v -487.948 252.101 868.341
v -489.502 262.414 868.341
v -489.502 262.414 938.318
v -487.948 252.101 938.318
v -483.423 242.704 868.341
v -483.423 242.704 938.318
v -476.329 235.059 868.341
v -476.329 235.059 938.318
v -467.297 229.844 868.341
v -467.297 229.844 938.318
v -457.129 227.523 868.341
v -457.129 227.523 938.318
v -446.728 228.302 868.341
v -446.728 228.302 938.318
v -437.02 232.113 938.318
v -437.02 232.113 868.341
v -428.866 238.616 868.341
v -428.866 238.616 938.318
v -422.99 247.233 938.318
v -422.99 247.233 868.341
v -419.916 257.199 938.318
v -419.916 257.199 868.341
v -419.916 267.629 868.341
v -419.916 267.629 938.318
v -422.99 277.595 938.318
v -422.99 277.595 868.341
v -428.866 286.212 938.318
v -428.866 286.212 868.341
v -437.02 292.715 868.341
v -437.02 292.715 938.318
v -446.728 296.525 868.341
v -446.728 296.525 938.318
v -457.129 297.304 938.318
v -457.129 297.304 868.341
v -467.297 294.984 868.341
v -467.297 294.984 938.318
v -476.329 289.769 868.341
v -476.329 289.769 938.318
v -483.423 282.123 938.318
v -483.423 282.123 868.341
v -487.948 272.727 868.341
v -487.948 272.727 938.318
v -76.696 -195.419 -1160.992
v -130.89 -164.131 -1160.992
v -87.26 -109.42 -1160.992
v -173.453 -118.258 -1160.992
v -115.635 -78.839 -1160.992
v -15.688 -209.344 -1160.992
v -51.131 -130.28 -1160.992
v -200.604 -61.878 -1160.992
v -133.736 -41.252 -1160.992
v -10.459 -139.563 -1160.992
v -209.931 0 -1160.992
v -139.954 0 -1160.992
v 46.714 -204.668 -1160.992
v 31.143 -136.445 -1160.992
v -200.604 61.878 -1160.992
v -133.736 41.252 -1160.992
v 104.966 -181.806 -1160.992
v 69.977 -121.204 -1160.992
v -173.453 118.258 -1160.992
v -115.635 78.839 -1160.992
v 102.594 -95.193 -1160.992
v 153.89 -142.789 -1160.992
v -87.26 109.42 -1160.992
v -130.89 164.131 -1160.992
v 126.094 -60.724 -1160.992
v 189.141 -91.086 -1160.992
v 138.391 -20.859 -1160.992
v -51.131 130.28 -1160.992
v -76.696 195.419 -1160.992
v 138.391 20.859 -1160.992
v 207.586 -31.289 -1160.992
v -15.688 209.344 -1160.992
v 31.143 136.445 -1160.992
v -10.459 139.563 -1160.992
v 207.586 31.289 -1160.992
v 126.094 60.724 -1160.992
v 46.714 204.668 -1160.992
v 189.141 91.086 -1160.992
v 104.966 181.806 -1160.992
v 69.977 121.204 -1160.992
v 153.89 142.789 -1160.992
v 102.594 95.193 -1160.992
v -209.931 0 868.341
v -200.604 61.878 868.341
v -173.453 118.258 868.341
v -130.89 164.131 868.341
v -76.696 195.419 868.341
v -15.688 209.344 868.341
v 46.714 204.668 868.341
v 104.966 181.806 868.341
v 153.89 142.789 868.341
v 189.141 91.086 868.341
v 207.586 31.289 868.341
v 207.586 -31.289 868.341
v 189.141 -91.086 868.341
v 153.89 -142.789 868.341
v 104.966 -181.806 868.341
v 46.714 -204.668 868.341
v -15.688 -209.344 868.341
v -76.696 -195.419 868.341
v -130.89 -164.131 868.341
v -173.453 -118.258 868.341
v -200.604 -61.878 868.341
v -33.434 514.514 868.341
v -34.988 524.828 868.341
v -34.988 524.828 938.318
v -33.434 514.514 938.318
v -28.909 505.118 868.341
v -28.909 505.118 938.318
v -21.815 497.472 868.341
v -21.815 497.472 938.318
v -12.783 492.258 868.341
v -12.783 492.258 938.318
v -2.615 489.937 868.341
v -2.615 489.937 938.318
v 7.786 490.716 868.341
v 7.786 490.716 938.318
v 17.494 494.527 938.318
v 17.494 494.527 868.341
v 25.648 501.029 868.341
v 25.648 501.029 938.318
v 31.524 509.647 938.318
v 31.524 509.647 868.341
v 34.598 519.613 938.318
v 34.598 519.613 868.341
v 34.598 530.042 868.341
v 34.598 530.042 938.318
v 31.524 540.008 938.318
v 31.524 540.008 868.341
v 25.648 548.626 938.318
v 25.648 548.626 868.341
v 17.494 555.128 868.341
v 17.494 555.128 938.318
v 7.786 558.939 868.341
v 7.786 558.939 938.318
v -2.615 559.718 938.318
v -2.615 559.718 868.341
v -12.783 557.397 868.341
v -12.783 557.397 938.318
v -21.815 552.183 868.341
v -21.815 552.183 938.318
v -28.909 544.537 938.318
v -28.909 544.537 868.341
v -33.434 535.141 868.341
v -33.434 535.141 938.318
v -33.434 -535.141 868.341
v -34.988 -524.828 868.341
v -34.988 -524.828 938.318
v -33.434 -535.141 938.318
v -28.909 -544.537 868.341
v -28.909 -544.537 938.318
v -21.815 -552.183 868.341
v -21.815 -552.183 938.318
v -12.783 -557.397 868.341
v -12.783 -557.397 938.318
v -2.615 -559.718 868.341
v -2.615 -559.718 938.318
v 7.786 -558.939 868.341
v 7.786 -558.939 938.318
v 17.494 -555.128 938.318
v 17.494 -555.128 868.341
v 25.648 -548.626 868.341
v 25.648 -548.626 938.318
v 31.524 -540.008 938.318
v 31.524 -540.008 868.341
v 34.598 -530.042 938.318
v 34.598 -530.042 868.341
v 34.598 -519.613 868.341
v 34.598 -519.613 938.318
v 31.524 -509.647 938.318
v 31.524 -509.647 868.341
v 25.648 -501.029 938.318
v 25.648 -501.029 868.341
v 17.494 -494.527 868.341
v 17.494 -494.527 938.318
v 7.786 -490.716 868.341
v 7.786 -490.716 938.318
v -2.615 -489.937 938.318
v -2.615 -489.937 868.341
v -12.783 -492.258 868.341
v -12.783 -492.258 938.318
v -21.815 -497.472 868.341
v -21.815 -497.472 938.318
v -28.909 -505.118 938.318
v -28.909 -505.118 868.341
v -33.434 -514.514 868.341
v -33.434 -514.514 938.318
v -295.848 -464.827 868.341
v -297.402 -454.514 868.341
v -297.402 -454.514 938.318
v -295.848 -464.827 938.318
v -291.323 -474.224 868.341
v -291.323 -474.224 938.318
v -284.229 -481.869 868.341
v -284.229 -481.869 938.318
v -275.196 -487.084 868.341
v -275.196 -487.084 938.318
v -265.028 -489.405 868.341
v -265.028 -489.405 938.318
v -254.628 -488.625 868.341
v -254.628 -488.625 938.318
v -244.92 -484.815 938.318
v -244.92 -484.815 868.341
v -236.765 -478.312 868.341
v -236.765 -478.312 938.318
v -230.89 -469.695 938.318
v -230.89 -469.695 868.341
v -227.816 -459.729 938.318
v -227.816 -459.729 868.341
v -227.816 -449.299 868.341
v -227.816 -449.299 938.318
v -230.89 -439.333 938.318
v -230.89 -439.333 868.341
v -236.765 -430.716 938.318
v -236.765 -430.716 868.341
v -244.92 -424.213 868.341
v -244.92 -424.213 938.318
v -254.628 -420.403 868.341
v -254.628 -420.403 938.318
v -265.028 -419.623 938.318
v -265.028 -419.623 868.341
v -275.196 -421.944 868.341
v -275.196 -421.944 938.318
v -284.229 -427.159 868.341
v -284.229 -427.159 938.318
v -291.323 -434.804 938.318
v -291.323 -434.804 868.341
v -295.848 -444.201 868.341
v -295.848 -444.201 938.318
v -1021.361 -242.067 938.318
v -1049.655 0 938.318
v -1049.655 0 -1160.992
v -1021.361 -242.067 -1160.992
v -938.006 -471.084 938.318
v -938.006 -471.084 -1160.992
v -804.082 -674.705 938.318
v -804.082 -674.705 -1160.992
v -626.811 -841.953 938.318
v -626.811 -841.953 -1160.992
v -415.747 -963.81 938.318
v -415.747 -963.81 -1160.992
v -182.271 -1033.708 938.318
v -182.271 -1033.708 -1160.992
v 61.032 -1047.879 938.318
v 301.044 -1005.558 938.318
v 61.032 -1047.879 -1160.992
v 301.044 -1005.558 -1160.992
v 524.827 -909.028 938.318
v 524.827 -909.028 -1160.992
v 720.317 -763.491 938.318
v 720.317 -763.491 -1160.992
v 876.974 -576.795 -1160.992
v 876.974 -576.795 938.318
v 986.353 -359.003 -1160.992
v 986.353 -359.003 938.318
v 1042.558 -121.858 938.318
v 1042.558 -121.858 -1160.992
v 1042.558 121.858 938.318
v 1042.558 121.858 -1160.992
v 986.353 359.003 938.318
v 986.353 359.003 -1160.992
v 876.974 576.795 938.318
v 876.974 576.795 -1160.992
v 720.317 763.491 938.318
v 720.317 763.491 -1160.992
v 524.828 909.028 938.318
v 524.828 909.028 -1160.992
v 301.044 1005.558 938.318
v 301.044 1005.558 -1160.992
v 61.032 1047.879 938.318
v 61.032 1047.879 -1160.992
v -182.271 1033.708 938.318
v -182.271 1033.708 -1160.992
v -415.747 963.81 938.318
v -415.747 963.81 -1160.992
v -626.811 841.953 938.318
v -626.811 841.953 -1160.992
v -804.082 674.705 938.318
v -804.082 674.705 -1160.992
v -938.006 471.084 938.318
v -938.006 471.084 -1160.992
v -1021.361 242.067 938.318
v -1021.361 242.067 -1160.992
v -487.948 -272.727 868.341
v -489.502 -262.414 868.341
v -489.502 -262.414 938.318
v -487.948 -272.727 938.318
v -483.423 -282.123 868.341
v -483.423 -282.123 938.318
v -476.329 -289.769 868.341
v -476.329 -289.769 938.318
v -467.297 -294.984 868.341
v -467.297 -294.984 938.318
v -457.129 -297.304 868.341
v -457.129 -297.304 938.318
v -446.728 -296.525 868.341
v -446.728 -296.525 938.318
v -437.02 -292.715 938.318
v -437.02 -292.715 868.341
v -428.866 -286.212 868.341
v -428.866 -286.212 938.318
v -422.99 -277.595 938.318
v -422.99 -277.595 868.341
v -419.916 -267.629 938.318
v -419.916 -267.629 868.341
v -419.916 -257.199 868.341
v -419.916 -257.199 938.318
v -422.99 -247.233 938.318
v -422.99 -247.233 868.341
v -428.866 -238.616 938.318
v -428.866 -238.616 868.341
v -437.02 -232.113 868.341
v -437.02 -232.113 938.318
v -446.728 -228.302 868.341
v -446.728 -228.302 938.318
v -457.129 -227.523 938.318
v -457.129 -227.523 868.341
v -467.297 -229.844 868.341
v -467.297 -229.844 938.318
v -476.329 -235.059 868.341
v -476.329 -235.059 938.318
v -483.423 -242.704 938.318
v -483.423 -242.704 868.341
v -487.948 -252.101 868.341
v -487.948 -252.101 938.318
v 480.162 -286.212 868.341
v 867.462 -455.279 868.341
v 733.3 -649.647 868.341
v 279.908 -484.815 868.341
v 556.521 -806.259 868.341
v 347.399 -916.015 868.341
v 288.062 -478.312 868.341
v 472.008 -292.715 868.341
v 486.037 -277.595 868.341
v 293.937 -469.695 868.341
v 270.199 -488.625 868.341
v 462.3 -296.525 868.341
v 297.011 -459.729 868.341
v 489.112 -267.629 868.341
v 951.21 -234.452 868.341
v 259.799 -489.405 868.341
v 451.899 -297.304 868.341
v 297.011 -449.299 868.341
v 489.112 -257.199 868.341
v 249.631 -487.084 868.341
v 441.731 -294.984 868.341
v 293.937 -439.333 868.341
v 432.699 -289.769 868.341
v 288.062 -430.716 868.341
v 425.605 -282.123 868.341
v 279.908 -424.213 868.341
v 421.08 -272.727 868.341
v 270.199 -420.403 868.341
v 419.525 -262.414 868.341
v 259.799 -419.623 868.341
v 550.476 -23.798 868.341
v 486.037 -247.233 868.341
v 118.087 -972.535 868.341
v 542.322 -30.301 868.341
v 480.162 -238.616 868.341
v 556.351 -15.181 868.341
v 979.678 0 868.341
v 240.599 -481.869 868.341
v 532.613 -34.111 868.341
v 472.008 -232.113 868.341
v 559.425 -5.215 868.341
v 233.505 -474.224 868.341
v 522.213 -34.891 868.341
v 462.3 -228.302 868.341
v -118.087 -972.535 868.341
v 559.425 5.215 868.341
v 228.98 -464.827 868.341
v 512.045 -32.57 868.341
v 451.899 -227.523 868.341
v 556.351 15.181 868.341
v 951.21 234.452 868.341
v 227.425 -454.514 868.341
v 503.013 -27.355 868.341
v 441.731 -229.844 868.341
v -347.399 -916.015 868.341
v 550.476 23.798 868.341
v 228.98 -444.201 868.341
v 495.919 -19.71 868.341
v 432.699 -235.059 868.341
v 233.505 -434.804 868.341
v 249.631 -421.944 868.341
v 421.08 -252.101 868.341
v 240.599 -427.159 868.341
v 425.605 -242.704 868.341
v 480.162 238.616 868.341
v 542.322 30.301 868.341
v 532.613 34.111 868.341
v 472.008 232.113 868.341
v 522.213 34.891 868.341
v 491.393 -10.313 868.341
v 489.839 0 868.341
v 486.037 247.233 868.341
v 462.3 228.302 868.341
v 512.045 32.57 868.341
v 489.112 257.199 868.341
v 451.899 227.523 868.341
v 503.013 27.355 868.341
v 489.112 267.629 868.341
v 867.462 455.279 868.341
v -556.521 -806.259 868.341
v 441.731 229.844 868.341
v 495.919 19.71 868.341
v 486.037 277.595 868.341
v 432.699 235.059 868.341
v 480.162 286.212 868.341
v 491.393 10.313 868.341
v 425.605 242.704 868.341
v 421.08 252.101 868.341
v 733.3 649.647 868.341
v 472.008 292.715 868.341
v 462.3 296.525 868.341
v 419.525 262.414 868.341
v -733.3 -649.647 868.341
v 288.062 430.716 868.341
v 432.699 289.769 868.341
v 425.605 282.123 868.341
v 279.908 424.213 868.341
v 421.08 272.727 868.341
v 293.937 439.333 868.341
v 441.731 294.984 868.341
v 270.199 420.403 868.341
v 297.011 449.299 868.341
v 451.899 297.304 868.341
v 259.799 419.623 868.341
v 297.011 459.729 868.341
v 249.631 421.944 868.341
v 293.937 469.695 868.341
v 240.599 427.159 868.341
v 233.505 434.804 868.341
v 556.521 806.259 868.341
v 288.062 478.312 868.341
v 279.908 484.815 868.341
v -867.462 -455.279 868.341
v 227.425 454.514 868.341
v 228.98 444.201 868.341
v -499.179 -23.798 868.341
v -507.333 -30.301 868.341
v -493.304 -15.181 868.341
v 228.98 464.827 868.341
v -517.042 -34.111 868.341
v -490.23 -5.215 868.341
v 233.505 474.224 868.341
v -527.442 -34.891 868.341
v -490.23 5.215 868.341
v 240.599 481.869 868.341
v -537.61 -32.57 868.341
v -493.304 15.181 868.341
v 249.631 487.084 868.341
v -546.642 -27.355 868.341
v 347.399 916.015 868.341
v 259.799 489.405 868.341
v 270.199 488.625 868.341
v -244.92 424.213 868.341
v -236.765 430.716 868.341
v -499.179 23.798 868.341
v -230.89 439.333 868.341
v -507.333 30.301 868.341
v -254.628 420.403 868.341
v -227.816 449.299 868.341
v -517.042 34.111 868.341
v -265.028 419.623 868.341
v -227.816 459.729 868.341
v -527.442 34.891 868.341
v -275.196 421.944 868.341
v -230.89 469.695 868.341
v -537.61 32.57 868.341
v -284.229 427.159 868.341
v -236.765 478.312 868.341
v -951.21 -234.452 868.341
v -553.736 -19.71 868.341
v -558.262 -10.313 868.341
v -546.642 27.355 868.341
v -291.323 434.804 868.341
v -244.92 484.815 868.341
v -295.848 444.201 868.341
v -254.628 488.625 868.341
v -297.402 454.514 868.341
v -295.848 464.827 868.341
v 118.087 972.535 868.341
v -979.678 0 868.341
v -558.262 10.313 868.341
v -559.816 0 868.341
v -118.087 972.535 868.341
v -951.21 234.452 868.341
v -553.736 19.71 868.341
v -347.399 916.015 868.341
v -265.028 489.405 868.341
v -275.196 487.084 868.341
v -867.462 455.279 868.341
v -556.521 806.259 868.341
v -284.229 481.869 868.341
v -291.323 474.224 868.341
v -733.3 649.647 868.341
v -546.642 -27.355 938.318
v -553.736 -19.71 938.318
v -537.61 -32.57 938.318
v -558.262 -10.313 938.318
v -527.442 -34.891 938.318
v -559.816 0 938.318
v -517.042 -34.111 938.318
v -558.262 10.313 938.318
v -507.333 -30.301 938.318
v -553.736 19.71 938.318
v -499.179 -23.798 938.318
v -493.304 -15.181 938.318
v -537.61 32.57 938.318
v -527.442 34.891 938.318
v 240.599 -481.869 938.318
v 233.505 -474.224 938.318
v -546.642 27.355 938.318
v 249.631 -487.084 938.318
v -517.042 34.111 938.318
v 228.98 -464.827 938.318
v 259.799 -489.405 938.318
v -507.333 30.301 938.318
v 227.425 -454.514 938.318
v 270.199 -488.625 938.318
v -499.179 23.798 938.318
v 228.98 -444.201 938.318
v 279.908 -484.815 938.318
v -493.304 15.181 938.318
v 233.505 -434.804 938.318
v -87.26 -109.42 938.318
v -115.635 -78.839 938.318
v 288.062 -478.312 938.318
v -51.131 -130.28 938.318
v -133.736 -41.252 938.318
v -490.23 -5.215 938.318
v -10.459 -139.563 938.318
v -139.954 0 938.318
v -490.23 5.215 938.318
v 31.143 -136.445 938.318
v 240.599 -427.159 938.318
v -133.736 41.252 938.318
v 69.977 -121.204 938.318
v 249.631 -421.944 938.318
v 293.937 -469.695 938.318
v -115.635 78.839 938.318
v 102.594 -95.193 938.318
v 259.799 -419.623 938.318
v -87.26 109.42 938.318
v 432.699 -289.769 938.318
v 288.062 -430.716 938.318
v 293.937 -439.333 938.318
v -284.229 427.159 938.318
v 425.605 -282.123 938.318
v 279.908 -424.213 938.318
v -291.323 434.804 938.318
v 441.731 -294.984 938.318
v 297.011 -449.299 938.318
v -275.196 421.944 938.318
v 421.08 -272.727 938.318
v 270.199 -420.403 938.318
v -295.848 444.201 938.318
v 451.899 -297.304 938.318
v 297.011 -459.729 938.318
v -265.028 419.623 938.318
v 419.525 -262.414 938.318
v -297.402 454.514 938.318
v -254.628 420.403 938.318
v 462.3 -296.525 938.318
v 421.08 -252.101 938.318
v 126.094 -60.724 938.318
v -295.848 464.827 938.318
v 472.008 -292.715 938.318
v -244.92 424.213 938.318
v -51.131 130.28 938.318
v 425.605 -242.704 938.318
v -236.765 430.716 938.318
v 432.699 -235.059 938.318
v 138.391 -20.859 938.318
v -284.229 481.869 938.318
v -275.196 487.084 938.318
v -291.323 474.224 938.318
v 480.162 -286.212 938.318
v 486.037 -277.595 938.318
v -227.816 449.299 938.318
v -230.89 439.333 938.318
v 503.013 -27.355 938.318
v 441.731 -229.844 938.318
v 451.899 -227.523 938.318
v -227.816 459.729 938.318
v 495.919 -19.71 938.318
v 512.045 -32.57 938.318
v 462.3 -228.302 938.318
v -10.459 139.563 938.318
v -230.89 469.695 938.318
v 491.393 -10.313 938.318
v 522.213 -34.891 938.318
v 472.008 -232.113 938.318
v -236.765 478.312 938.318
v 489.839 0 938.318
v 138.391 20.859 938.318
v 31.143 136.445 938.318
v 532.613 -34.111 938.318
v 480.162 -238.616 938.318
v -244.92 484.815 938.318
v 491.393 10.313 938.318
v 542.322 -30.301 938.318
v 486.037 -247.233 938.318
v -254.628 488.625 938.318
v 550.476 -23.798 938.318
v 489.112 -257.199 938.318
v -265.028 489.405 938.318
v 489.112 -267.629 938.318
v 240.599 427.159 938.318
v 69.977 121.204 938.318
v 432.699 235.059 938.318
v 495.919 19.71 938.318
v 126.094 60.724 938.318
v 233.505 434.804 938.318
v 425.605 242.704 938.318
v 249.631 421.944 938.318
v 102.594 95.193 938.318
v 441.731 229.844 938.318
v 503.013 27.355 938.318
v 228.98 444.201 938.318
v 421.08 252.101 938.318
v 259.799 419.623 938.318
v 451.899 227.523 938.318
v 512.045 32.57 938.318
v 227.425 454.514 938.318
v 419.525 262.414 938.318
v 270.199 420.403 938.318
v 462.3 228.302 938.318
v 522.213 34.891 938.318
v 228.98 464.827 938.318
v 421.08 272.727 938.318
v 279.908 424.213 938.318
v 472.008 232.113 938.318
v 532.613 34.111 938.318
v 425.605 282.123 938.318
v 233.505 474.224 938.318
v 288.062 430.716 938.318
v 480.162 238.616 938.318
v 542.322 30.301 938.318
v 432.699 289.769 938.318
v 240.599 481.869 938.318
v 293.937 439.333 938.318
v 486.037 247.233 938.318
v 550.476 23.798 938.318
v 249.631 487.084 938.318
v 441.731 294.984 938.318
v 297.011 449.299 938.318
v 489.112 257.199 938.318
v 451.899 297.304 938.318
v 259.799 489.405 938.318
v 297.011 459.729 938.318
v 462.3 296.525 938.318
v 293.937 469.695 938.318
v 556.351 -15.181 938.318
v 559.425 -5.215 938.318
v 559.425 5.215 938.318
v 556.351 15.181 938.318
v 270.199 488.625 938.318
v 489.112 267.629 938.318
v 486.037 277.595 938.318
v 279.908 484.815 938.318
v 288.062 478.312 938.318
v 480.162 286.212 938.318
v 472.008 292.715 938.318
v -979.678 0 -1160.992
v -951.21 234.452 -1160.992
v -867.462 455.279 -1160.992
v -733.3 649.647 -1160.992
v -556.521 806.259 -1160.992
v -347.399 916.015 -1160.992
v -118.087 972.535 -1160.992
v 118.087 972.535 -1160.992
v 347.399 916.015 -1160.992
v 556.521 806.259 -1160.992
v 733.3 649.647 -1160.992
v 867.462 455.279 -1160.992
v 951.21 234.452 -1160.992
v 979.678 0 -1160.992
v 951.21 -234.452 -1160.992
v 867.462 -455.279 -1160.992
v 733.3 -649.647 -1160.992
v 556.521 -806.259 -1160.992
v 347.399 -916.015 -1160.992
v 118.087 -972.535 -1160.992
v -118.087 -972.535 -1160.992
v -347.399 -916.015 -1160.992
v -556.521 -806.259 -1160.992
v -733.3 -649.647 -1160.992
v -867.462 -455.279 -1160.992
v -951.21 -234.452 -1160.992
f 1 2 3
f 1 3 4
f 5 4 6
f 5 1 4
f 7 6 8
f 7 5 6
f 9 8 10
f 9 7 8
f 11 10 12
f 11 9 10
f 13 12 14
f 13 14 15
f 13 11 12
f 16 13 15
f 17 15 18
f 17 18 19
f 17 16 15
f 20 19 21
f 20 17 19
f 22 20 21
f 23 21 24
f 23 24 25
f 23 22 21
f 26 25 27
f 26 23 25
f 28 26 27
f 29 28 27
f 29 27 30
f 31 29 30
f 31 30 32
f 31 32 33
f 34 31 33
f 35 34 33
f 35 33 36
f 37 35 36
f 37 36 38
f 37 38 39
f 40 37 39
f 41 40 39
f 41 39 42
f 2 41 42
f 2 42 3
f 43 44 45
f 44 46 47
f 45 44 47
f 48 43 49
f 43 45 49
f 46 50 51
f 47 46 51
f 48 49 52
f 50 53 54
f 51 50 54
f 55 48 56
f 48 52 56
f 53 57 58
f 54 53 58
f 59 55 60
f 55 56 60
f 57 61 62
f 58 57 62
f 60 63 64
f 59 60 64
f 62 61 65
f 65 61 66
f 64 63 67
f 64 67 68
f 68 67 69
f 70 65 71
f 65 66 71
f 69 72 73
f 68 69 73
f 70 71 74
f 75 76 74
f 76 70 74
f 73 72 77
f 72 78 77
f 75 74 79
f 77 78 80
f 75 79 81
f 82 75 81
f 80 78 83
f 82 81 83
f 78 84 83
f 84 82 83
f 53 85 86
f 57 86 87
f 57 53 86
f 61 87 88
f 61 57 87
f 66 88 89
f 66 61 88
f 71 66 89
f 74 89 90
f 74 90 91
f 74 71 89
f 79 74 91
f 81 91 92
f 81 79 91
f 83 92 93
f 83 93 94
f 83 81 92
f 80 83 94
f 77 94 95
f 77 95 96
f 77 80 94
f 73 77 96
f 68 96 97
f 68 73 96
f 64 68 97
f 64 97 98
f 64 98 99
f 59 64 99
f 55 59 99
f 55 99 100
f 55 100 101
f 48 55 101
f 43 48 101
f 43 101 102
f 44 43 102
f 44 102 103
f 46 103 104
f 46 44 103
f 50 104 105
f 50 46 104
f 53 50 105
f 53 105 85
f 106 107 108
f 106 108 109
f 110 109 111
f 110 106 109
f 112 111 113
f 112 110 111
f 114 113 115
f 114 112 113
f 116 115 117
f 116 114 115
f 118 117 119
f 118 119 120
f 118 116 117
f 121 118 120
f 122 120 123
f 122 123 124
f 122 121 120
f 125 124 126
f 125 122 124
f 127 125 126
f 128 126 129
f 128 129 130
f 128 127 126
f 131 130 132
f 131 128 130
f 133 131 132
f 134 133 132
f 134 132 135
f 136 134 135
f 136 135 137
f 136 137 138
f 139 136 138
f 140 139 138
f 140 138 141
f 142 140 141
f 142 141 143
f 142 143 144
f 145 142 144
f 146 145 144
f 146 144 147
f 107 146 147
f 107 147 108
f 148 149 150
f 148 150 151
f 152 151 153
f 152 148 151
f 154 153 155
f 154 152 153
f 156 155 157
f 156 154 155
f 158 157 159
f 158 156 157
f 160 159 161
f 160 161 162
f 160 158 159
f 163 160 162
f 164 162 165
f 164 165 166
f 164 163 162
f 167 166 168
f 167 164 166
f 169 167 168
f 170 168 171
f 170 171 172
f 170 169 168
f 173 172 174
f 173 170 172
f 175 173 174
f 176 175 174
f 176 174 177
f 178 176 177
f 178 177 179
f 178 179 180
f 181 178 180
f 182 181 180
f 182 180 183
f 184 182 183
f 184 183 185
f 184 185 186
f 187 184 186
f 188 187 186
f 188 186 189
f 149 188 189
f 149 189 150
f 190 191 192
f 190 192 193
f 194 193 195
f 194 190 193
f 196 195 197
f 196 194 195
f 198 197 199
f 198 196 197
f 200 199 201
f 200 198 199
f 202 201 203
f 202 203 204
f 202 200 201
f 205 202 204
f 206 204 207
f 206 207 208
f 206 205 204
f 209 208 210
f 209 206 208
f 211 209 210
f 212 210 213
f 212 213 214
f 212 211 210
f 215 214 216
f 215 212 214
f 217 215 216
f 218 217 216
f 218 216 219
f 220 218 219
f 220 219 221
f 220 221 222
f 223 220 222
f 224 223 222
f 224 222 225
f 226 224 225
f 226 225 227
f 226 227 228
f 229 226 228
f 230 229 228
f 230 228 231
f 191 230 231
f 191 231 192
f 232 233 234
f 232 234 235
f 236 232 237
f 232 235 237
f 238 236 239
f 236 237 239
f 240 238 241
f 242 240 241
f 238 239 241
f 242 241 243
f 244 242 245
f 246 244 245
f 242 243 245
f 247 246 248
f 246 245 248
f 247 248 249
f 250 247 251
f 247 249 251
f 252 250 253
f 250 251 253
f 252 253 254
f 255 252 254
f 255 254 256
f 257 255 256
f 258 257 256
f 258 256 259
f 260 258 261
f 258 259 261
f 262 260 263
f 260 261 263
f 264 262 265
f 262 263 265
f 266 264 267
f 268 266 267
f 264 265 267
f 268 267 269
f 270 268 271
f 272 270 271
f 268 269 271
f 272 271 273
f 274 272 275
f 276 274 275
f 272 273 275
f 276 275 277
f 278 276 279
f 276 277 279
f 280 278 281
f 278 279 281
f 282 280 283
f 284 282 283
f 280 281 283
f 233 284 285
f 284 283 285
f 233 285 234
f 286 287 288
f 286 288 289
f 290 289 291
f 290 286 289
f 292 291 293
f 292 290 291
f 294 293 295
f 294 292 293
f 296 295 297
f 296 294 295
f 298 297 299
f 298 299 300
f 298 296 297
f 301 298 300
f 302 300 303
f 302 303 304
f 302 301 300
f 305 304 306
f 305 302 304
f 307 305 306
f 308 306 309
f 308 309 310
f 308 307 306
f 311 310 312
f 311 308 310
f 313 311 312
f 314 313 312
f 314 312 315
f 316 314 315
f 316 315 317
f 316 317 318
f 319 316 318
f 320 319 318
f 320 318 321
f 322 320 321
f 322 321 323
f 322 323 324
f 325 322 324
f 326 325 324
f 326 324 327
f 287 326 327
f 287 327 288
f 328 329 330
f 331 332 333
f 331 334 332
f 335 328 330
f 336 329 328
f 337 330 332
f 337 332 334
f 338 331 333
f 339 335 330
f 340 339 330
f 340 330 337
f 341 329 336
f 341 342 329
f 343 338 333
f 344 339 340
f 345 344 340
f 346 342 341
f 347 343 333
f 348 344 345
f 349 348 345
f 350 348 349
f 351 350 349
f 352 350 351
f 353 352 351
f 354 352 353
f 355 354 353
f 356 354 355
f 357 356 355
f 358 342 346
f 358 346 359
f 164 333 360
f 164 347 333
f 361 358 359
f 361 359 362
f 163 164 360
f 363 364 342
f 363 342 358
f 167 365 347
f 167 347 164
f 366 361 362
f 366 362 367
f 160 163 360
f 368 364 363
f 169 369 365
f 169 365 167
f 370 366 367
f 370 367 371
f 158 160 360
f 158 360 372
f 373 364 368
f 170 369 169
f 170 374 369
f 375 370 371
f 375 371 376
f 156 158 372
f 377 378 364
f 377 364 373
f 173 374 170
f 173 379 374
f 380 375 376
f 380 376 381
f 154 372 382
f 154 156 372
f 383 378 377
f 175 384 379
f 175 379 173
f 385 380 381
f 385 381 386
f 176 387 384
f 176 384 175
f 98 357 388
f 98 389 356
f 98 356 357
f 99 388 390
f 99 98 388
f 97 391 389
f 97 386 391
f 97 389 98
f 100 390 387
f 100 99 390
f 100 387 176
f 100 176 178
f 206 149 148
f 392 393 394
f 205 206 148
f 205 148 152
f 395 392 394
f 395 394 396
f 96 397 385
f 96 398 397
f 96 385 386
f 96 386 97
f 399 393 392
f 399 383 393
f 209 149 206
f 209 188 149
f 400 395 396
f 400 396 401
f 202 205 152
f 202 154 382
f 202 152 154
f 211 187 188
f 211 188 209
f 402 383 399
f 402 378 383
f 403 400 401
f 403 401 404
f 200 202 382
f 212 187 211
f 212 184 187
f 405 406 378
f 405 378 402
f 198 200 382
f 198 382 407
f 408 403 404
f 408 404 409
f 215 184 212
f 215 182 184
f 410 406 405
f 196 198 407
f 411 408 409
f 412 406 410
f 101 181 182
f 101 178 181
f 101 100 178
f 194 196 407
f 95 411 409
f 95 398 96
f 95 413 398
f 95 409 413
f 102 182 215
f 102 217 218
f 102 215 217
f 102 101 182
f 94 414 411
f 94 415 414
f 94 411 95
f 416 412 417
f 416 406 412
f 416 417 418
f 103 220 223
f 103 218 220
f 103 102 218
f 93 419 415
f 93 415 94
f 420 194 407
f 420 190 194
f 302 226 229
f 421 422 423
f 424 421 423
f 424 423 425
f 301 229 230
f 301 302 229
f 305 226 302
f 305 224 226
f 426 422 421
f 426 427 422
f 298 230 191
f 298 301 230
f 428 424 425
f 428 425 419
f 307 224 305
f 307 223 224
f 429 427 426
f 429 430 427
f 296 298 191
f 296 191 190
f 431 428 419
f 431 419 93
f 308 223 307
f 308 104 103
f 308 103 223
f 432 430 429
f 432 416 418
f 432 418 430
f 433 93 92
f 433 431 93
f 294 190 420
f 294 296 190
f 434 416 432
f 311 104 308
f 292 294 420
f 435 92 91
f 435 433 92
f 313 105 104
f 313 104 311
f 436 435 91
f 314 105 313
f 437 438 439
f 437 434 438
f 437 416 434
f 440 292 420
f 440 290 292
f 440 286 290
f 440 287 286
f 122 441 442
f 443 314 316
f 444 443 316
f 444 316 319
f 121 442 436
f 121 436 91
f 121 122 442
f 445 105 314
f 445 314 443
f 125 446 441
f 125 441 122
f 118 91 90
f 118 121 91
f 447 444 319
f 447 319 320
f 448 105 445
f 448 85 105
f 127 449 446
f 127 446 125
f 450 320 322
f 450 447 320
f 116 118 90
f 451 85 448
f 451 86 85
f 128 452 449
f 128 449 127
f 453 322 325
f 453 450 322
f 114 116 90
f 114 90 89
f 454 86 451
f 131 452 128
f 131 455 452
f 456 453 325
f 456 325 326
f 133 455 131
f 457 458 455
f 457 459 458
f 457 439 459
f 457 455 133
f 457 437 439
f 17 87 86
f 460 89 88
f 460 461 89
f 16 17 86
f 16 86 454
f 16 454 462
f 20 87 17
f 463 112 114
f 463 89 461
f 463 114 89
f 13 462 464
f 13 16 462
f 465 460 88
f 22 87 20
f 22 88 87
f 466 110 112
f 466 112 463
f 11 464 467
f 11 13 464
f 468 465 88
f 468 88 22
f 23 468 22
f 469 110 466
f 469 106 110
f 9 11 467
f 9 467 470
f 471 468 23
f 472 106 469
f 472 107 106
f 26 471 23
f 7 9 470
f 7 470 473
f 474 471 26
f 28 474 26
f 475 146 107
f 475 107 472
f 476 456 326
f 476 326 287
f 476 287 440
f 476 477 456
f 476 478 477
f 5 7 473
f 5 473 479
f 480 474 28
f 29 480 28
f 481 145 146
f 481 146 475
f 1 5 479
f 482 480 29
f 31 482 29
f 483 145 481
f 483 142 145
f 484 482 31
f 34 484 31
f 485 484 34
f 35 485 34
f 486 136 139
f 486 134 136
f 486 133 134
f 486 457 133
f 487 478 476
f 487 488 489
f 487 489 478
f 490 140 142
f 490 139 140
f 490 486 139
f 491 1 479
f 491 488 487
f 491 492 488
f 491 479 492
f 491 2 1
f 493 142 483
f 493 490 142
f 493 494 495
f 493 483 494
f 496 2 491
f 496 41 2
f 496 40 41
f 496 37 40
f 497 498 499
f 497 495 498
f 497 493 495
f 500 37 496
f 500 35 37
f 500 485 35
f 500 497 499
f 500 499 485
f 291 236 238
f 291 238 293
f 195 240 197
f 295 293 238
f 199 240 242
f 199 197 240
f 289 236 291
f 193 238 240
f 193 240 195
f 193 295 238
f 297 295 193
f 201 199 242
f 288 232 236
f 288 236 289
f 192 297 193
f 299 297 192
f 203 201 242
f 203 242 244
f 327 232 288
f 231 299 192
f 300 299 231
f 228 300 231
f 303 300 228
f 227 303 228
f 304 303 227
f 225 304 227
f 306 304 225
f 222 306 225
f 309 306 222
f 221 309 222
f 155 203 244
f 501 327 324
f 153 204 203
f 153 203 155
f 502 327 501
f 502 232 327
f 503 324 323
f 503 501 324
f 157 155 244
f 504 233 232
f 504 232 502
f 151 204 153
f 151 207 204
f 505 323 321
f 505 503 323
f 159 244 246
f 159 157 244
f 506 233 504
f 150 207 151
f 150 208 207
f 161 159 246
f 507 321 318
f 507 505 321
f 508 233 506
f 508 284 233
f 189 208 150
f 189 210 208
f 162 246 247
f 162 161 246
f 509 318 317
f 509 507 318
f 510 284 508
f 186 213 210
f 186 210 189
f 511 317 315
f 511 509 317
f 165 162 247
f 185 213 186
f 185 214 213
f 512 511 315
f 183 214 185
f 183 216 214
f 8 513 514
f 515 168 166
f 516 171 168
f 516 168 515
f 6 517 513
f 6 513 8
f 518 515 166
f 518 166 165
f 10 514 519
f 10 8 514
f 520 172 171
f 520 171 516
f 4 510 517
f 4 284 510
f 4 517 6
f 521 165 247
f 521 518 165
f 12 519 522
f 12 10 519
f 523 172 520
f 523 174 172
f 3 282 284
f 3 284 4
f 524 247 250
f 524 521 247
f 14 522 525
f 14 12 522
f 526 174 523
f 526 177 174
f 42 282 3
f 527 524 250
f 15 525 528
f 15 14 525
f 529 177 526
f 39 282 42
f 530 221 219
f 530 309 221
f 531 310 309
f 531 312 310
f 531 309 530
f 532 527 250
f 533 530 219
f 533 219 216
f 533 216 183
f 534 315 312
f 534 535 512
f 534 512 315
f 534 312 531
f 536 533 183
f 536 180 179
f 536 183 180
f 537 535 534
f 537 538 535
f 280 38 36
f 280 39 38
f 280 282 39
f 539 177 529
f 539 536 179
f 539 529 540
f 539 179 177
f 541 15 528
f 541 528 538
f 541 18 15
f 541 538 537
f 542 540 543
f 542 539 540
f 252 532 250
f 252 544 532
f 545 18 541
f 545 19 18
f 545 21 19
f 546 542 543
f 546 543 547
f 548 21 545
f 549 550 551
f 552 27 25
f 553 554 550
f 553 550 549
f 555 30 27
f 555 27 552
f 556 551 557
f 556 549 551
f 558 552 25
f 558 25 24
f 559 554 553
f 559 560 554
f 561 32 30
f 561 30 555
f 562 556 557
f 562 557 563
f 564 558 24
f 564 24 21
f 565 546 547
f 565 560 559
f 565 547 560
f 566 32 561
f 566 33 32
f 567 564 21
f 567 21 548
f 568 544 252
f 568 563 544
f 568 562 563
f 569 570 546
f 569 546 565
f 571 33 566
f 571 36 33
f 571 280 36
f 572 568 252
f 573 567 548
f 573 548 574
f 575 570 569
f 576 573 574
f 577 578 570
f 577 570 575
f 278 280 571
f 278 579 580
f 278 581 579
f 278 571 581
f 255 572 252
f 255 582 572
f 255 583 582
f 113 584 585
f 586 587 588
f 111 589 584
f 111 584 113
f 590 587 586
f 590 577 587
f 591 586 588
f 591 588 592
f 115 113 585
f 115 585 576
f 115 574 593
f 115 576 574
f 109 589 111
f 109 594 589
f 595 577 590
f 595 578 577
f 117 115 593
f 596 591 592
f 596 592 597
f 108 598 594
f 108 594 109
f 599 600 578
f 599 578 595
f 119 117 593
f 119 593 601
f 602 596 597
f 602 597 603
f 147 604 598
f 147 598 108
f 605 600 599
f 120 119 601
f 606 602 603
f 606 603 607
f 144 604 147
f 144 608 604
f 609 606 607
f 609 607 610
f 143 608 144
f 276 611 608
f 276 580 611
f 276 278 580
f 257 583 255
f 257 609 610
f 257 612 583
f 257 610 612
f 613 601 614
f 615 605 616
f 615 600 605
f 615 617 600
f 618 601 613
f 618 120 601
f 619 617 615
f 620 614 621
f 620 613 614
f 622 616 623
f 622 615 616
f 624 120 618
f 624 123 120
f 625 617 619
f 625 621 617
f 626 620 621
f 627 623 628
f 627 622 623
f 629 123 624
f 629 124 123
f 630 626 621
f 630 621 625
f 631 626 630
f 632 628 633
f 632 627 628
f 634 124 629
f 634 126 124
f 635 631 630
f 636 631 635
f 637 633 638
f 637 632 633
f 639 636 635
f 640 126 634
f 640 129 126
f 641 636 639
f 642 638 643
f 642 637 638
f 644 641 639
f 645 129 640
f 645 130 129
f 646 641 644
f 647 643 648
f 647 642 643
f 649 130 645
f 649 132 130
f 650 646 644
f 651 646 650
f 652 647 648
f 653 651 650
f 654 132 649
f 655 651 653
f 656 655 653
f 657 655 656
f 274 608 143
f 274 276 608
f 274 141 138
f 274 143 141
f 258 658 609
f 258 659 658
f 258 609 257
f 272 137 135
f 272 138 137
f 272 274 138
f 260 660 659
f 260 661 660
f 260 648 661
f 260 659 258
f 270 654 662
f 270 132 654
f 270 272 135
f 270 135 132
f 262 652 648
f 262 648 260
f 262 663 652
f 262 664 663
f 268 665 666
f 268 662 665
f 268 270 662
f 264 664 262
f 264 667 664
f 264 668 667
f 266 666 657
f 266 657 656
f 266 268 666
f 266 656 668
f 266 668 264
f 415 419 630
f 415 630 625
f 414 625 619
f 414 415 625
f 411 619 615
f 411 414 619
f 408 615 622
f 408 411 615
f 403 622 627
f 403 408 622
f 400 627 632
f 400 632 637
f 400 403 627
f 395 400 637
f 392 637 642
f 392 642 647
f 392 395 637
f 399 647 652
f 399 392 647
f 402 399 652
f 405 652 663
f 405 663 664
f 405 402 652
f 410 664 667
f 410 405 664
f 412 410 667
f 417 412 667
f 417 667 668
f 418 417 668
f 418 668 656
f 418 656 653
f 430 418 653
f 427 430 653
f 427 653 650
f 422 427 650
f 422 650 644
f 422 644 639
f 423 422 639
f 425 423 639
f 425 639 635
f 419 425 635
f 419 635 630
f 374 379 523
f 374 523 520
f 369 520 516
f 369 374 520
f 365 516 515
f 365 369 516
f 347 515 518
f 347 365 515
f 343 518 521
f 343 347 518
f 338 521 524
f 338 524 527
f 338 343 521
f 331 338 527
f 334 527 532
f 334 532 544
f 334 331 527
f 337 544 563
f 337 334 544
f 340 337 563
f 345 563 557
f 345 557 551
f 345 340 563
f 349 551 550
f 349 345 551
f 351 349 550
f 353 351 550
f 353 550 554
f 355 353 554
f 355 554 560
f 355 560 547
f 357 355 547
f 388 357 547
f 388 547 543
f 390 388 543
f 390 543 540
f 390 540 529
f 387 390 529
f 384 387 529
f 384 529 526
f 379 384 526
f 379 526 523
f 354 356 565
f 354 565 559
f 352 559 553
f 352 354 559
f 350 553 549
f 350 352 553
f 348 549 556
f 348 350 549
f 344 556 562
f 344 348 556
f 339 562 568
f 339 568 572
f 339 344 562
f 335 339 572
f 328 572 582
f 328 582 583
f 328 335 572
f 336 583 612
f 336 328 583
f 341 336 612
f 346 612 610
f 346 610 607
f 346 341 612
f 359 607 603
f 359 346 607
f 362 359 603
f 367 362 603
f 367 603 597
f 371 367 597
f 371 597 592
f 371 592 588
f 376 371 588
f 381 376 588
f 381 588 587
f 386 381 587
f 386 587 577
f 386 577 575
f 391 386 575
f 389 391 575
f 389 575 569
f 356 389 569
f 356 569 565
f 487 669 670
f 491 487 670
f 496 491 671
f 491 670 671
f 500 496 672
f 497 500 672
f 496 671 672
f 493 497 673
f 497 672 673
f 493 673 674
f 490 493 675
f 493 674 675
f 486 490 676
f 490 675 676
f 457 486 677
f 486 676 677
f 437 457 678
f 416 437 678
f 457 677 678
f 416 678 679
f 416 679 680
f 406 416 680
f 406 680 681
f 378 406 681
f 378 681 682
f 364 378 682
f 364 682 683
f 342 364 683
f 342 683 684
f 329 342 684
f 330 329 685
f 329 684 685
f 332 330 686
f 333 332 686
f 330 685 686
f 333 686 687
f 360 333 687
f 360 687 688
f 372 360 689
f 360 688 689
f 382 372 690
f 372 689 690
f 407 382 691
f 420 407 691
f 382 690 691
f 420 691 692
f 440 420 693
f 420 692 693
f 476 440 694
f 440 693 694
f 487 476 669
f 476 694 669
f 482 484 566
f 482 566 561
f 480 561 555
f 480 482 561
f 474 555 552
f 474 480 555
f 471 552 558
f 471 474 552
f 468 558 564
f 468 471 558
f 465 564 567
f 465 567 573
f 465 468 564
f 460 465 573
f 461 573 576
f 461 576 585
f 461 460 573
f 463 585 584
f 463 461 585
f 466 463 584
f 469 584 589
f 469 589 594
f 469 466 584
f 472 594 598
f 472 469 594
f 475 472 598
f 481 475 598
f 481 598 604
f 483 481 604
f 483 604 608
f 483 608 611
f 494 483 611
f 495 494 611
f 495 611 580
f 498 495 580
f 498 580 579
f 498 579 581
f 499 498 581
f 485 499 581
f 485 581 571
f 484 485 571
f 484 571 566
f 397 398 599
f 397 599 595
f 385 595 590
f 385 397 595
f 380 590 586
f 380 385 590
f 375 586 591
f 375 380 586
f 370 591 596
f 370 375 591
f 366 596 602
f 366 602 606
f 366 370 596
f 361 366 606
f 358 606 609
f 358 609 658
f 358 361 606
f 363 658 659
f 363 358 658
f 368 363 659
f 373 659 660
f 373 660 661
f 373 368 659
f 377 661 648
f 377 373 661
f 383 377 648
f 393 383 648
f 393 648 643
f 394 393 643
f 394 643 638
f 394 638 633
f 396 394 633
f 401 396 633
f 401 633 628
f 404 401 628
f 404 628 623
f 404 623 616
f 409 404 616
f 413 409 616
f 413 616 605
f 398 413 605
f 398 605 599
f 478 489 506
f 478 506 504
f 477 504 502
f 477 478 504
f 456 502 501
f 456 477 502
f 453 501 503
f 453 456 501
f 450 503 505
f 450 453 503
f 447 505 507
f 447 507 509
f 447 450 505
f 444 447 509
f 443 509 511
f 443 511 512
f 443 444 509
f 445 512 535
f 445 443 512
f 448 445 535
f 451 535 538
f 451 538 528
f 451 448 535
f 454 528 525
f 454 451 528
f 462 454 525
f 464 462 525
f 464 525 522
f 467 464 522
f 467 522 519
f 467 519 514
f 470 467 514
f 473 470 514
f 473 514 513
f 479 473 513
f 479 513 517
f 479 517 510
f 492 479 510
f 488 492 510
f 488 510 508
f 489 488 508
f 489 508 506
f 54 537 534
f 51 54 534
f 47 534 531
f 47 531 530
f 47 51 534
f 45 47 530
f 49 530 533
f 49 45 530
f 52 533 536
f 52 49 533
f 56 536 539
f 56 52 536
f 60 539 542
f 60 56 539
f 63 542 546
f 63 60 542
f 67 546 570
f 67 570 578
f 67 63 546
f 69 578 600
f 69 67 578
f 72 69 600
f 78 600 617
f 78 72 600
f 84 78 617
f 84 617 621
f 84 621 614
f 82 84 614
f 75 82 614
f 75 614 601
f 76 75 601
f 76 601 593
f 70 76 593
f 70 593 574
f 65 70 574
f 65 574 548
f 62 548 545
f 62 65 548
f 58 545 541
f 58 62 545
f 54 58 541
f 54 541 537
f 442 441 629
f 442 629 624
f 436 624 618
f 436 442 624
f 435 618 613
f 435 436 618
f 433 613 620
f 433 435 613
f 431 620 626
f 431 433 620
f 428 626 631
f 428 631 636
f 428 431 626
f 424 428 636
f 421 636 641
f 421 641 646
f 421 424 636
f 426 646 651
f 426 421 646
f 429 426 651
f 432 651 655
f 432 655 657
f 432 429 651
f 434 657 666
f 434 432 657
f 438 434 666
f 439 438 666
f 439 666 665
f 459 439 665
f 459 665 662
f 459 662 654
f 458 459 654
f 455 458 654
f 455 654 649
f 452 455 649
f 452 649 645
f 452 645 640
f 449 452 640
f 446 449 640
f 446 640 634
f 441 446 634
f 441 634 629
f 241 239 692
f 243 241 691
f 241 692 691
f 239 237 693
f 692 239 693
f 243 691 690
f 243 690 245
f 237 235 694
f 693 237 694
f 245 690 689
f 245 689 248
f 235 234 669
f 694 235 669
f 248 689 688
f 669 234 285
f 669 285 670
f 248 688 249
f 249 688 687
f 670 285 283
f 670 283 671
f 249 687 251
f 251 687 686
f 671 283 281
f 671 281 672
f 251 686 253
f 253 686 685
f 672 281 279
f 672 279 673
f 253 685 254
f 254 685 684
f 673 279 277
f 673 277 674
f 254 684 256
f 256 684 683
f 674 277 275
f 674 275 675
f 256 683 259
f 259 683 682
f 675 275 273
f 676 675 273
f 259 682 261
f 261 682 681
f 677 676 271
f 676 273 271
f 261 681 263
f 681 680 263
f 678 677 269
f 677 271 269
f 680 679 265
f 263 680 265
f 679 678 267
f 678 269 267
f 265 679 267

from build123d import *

# Parameters (mm, degrees)
SKETCH1_R           = 38.1
SKETCH1_R_2         = 35.56
SKETCH1_R_3         = 1.27
SKETCH1_R_4         = 7.62
SKETCH1_R_5         = 5.08
BOSS_EXTRUDE1_DEPTH = 76.2
SKETCH3_R           = 35.56
SKETCH3_R_2         = 7.62
SKETCH3_R_3         = 1.27
CUT_EXTRUDE1_DEPTH  = 73.66
SCALE3_SCALE        = 29
SCALE4_SCALE        = 0.95


with BuildPart() as part:
    # Sketch1 → Boss-Extrude1 (new body)
    # profile 1 of 3: a face of its own
    with BuildSketch(Plane.XY):
        with Locations(Location((0, 0, 0), (0, 0, 180))):
            Circle(SKETCH1_R)
        Circle(SKETCH1_R_2, mode=Mode.SUBTRACT)
    # profile 2 of 3: a face of its own
    with BuildSketch(Plane.XY):
        Circle(SKETCH1_R_2)
        with Locations(Location((-9.525, 16.497783942, 0), (0, 0, 180))):
            Circle(SKETCH1_R_3, mode=Mode.SUBTRACT)
        with Locations(Location((-16.497783942, 9.525, 0), (0, 0, 180))):
            Circle(SKETCH1_R_3, mode=Mode.SUBTRACT)
        with Locations(Location((-19.05, 0, 0), (0, 0, 180))):
            Circle(SKETCH1_R_3, mode=Mode.SUBTRACT)
        with Locations(Location((-16.497783942, -9.525, 0), (0, 0, 180))):
            Circle(SKETCH1_R_3, mode=Mode.SUBTRACT)
        with Locations(Location((-9.525, -16.497783942, 0), (0, 0, 180))):
            Circle(SKETCH1_R_3, mode=Mode.SUBTRACT)
        with Locations(Location((0, -19.05, 0), (0, 0, 180))):
            Circle(SKETCH1_R_3, mode=Mode.SUBTRACT)
        with Locations(Location((9.525, -16.497783942, 0), (0, 0, 180))):
            Circle(SKETCH1_R_3, mode=Mode.SUBTRACT)
        with Locations(Location((16.497783942, -9.525, 0), (0, 0, 180))):
            Circle(SKETCH1_R_3, mode=Mode.SUBTRACT)
        with Locations(Location((19.05, 0, 0), (0, 0, 180))):
            Circle(SKETCH1_R_3, mode=Mode.SUBTRACT)
        with Locations(Location((16.497783942, 9.525, 0), (0, 0, 180))):
            Circle(SKETCH1_R_3, mode=Mode.SUBTRACT)
        with Locations(Location((9.525, 16.497783942, 0), (0, 0, 180))):
            Circle(SKETCH1_R_3, mode=Mode.SUBTRACT)
        with Locations(Location((0, 19.05, 0), (0, 0, 180))):
            Circle(SKETCH1_R_3, mode=Mode.SUBTRACT)
        Circle(SKETCH1_R_4, mode=Mode.SUBTRACT)
    # profile 3 of 3: a face of its own
    with BuildSketch(Plane.XY):
        Circle(SKETCH1_R_4)
        with Locations(Location((0, 0, 0), (0, 0, 180))):
            Circle(SKETCH1_R_5, mode=Mode.SUBTRACT)
    extrude(amount=BOSS_EXTRUDE1_DEPTH)

    # Sketch3 → Cut-Extrude1 (cut)
    with BuildSketch(Plane(origin=(0, 0, 0), x_dir=(-1, 0, 0), z_dir=(0, 0, -1))):
        Circle(SKETCH3_R)
        Circle(SKETCH3_R_2, mode=Mode.SUBTRACT)
        with Locations((16.497783942, 9.525)):
            Circle(SKETCH3_R_3, mode=Mode.SUBTRACT)
        with Locations((16.497783942, -9.525)):
            Circle(SKETCH3_R_3, mode=Mode.SUBTRACT)
        with Locations((0, -19.05)):
            Circle(SKETCH3_R_3, mode=Mode.SUBTRACT)
        with Locations((-16.497783942, -9.525)):
            Circle(SKETCH3_R_3, mode=Mode.SUBTRACT)
        with Locations((-16.497783942, 9.525)):
            Circle(SKETCH3_R_3, mode=Mode.SUBTRACT)
        with Locations((0, 19.05)):
            Circle(SKETCH3_R_3, mode=Mode.SUBTRACT)
        with Locations((-9.525, 16.497783942)):
            Circle(SKETCH3_R_3, mode=Mode.SUBTRACT)
        with Locations((-19.05, 0)):
            Circle(SKETCH3_R_3, mode=Mode.SUBTRACT)
        with Locations((-9.525, -16.497783942)):
            Circle(SKETCH3_R_3, mode=Mode.SUBTRACT)
        with Locations((9.525, -16.497783942)):
            Circle(SKETCH3_R_3, mode=Mode.SUBTRACT)
        with Locations((19.05, 0)):
            Circle(SKETCH3_R_3, mode=Mode.SUBTRACT)
        with Locations((9.525, 16.497783942)):
            Circle(SKETCH3_R_3, mode=Mode.SUBTRACT)
    extrude(amount=-CUT_EXTRUDE1_DEPTH, mode=Mode.SUBTRACT)


with BuildPart() as part_1:
    # Scale3: scaled about (0, 0, 43.728504983)
    add(part.part.scale(SCALE3_SCALE).moved(Location((0, 0, -1224.398139524))))


with BuildPart() as part_2:
    # Scale4: scaled about (0, 0, 43.728504994)
    add(part_1.part.scale(SCALE4_SCALE).moved(Location((0, 0, 2.18642525))))


solid = part_2.part
